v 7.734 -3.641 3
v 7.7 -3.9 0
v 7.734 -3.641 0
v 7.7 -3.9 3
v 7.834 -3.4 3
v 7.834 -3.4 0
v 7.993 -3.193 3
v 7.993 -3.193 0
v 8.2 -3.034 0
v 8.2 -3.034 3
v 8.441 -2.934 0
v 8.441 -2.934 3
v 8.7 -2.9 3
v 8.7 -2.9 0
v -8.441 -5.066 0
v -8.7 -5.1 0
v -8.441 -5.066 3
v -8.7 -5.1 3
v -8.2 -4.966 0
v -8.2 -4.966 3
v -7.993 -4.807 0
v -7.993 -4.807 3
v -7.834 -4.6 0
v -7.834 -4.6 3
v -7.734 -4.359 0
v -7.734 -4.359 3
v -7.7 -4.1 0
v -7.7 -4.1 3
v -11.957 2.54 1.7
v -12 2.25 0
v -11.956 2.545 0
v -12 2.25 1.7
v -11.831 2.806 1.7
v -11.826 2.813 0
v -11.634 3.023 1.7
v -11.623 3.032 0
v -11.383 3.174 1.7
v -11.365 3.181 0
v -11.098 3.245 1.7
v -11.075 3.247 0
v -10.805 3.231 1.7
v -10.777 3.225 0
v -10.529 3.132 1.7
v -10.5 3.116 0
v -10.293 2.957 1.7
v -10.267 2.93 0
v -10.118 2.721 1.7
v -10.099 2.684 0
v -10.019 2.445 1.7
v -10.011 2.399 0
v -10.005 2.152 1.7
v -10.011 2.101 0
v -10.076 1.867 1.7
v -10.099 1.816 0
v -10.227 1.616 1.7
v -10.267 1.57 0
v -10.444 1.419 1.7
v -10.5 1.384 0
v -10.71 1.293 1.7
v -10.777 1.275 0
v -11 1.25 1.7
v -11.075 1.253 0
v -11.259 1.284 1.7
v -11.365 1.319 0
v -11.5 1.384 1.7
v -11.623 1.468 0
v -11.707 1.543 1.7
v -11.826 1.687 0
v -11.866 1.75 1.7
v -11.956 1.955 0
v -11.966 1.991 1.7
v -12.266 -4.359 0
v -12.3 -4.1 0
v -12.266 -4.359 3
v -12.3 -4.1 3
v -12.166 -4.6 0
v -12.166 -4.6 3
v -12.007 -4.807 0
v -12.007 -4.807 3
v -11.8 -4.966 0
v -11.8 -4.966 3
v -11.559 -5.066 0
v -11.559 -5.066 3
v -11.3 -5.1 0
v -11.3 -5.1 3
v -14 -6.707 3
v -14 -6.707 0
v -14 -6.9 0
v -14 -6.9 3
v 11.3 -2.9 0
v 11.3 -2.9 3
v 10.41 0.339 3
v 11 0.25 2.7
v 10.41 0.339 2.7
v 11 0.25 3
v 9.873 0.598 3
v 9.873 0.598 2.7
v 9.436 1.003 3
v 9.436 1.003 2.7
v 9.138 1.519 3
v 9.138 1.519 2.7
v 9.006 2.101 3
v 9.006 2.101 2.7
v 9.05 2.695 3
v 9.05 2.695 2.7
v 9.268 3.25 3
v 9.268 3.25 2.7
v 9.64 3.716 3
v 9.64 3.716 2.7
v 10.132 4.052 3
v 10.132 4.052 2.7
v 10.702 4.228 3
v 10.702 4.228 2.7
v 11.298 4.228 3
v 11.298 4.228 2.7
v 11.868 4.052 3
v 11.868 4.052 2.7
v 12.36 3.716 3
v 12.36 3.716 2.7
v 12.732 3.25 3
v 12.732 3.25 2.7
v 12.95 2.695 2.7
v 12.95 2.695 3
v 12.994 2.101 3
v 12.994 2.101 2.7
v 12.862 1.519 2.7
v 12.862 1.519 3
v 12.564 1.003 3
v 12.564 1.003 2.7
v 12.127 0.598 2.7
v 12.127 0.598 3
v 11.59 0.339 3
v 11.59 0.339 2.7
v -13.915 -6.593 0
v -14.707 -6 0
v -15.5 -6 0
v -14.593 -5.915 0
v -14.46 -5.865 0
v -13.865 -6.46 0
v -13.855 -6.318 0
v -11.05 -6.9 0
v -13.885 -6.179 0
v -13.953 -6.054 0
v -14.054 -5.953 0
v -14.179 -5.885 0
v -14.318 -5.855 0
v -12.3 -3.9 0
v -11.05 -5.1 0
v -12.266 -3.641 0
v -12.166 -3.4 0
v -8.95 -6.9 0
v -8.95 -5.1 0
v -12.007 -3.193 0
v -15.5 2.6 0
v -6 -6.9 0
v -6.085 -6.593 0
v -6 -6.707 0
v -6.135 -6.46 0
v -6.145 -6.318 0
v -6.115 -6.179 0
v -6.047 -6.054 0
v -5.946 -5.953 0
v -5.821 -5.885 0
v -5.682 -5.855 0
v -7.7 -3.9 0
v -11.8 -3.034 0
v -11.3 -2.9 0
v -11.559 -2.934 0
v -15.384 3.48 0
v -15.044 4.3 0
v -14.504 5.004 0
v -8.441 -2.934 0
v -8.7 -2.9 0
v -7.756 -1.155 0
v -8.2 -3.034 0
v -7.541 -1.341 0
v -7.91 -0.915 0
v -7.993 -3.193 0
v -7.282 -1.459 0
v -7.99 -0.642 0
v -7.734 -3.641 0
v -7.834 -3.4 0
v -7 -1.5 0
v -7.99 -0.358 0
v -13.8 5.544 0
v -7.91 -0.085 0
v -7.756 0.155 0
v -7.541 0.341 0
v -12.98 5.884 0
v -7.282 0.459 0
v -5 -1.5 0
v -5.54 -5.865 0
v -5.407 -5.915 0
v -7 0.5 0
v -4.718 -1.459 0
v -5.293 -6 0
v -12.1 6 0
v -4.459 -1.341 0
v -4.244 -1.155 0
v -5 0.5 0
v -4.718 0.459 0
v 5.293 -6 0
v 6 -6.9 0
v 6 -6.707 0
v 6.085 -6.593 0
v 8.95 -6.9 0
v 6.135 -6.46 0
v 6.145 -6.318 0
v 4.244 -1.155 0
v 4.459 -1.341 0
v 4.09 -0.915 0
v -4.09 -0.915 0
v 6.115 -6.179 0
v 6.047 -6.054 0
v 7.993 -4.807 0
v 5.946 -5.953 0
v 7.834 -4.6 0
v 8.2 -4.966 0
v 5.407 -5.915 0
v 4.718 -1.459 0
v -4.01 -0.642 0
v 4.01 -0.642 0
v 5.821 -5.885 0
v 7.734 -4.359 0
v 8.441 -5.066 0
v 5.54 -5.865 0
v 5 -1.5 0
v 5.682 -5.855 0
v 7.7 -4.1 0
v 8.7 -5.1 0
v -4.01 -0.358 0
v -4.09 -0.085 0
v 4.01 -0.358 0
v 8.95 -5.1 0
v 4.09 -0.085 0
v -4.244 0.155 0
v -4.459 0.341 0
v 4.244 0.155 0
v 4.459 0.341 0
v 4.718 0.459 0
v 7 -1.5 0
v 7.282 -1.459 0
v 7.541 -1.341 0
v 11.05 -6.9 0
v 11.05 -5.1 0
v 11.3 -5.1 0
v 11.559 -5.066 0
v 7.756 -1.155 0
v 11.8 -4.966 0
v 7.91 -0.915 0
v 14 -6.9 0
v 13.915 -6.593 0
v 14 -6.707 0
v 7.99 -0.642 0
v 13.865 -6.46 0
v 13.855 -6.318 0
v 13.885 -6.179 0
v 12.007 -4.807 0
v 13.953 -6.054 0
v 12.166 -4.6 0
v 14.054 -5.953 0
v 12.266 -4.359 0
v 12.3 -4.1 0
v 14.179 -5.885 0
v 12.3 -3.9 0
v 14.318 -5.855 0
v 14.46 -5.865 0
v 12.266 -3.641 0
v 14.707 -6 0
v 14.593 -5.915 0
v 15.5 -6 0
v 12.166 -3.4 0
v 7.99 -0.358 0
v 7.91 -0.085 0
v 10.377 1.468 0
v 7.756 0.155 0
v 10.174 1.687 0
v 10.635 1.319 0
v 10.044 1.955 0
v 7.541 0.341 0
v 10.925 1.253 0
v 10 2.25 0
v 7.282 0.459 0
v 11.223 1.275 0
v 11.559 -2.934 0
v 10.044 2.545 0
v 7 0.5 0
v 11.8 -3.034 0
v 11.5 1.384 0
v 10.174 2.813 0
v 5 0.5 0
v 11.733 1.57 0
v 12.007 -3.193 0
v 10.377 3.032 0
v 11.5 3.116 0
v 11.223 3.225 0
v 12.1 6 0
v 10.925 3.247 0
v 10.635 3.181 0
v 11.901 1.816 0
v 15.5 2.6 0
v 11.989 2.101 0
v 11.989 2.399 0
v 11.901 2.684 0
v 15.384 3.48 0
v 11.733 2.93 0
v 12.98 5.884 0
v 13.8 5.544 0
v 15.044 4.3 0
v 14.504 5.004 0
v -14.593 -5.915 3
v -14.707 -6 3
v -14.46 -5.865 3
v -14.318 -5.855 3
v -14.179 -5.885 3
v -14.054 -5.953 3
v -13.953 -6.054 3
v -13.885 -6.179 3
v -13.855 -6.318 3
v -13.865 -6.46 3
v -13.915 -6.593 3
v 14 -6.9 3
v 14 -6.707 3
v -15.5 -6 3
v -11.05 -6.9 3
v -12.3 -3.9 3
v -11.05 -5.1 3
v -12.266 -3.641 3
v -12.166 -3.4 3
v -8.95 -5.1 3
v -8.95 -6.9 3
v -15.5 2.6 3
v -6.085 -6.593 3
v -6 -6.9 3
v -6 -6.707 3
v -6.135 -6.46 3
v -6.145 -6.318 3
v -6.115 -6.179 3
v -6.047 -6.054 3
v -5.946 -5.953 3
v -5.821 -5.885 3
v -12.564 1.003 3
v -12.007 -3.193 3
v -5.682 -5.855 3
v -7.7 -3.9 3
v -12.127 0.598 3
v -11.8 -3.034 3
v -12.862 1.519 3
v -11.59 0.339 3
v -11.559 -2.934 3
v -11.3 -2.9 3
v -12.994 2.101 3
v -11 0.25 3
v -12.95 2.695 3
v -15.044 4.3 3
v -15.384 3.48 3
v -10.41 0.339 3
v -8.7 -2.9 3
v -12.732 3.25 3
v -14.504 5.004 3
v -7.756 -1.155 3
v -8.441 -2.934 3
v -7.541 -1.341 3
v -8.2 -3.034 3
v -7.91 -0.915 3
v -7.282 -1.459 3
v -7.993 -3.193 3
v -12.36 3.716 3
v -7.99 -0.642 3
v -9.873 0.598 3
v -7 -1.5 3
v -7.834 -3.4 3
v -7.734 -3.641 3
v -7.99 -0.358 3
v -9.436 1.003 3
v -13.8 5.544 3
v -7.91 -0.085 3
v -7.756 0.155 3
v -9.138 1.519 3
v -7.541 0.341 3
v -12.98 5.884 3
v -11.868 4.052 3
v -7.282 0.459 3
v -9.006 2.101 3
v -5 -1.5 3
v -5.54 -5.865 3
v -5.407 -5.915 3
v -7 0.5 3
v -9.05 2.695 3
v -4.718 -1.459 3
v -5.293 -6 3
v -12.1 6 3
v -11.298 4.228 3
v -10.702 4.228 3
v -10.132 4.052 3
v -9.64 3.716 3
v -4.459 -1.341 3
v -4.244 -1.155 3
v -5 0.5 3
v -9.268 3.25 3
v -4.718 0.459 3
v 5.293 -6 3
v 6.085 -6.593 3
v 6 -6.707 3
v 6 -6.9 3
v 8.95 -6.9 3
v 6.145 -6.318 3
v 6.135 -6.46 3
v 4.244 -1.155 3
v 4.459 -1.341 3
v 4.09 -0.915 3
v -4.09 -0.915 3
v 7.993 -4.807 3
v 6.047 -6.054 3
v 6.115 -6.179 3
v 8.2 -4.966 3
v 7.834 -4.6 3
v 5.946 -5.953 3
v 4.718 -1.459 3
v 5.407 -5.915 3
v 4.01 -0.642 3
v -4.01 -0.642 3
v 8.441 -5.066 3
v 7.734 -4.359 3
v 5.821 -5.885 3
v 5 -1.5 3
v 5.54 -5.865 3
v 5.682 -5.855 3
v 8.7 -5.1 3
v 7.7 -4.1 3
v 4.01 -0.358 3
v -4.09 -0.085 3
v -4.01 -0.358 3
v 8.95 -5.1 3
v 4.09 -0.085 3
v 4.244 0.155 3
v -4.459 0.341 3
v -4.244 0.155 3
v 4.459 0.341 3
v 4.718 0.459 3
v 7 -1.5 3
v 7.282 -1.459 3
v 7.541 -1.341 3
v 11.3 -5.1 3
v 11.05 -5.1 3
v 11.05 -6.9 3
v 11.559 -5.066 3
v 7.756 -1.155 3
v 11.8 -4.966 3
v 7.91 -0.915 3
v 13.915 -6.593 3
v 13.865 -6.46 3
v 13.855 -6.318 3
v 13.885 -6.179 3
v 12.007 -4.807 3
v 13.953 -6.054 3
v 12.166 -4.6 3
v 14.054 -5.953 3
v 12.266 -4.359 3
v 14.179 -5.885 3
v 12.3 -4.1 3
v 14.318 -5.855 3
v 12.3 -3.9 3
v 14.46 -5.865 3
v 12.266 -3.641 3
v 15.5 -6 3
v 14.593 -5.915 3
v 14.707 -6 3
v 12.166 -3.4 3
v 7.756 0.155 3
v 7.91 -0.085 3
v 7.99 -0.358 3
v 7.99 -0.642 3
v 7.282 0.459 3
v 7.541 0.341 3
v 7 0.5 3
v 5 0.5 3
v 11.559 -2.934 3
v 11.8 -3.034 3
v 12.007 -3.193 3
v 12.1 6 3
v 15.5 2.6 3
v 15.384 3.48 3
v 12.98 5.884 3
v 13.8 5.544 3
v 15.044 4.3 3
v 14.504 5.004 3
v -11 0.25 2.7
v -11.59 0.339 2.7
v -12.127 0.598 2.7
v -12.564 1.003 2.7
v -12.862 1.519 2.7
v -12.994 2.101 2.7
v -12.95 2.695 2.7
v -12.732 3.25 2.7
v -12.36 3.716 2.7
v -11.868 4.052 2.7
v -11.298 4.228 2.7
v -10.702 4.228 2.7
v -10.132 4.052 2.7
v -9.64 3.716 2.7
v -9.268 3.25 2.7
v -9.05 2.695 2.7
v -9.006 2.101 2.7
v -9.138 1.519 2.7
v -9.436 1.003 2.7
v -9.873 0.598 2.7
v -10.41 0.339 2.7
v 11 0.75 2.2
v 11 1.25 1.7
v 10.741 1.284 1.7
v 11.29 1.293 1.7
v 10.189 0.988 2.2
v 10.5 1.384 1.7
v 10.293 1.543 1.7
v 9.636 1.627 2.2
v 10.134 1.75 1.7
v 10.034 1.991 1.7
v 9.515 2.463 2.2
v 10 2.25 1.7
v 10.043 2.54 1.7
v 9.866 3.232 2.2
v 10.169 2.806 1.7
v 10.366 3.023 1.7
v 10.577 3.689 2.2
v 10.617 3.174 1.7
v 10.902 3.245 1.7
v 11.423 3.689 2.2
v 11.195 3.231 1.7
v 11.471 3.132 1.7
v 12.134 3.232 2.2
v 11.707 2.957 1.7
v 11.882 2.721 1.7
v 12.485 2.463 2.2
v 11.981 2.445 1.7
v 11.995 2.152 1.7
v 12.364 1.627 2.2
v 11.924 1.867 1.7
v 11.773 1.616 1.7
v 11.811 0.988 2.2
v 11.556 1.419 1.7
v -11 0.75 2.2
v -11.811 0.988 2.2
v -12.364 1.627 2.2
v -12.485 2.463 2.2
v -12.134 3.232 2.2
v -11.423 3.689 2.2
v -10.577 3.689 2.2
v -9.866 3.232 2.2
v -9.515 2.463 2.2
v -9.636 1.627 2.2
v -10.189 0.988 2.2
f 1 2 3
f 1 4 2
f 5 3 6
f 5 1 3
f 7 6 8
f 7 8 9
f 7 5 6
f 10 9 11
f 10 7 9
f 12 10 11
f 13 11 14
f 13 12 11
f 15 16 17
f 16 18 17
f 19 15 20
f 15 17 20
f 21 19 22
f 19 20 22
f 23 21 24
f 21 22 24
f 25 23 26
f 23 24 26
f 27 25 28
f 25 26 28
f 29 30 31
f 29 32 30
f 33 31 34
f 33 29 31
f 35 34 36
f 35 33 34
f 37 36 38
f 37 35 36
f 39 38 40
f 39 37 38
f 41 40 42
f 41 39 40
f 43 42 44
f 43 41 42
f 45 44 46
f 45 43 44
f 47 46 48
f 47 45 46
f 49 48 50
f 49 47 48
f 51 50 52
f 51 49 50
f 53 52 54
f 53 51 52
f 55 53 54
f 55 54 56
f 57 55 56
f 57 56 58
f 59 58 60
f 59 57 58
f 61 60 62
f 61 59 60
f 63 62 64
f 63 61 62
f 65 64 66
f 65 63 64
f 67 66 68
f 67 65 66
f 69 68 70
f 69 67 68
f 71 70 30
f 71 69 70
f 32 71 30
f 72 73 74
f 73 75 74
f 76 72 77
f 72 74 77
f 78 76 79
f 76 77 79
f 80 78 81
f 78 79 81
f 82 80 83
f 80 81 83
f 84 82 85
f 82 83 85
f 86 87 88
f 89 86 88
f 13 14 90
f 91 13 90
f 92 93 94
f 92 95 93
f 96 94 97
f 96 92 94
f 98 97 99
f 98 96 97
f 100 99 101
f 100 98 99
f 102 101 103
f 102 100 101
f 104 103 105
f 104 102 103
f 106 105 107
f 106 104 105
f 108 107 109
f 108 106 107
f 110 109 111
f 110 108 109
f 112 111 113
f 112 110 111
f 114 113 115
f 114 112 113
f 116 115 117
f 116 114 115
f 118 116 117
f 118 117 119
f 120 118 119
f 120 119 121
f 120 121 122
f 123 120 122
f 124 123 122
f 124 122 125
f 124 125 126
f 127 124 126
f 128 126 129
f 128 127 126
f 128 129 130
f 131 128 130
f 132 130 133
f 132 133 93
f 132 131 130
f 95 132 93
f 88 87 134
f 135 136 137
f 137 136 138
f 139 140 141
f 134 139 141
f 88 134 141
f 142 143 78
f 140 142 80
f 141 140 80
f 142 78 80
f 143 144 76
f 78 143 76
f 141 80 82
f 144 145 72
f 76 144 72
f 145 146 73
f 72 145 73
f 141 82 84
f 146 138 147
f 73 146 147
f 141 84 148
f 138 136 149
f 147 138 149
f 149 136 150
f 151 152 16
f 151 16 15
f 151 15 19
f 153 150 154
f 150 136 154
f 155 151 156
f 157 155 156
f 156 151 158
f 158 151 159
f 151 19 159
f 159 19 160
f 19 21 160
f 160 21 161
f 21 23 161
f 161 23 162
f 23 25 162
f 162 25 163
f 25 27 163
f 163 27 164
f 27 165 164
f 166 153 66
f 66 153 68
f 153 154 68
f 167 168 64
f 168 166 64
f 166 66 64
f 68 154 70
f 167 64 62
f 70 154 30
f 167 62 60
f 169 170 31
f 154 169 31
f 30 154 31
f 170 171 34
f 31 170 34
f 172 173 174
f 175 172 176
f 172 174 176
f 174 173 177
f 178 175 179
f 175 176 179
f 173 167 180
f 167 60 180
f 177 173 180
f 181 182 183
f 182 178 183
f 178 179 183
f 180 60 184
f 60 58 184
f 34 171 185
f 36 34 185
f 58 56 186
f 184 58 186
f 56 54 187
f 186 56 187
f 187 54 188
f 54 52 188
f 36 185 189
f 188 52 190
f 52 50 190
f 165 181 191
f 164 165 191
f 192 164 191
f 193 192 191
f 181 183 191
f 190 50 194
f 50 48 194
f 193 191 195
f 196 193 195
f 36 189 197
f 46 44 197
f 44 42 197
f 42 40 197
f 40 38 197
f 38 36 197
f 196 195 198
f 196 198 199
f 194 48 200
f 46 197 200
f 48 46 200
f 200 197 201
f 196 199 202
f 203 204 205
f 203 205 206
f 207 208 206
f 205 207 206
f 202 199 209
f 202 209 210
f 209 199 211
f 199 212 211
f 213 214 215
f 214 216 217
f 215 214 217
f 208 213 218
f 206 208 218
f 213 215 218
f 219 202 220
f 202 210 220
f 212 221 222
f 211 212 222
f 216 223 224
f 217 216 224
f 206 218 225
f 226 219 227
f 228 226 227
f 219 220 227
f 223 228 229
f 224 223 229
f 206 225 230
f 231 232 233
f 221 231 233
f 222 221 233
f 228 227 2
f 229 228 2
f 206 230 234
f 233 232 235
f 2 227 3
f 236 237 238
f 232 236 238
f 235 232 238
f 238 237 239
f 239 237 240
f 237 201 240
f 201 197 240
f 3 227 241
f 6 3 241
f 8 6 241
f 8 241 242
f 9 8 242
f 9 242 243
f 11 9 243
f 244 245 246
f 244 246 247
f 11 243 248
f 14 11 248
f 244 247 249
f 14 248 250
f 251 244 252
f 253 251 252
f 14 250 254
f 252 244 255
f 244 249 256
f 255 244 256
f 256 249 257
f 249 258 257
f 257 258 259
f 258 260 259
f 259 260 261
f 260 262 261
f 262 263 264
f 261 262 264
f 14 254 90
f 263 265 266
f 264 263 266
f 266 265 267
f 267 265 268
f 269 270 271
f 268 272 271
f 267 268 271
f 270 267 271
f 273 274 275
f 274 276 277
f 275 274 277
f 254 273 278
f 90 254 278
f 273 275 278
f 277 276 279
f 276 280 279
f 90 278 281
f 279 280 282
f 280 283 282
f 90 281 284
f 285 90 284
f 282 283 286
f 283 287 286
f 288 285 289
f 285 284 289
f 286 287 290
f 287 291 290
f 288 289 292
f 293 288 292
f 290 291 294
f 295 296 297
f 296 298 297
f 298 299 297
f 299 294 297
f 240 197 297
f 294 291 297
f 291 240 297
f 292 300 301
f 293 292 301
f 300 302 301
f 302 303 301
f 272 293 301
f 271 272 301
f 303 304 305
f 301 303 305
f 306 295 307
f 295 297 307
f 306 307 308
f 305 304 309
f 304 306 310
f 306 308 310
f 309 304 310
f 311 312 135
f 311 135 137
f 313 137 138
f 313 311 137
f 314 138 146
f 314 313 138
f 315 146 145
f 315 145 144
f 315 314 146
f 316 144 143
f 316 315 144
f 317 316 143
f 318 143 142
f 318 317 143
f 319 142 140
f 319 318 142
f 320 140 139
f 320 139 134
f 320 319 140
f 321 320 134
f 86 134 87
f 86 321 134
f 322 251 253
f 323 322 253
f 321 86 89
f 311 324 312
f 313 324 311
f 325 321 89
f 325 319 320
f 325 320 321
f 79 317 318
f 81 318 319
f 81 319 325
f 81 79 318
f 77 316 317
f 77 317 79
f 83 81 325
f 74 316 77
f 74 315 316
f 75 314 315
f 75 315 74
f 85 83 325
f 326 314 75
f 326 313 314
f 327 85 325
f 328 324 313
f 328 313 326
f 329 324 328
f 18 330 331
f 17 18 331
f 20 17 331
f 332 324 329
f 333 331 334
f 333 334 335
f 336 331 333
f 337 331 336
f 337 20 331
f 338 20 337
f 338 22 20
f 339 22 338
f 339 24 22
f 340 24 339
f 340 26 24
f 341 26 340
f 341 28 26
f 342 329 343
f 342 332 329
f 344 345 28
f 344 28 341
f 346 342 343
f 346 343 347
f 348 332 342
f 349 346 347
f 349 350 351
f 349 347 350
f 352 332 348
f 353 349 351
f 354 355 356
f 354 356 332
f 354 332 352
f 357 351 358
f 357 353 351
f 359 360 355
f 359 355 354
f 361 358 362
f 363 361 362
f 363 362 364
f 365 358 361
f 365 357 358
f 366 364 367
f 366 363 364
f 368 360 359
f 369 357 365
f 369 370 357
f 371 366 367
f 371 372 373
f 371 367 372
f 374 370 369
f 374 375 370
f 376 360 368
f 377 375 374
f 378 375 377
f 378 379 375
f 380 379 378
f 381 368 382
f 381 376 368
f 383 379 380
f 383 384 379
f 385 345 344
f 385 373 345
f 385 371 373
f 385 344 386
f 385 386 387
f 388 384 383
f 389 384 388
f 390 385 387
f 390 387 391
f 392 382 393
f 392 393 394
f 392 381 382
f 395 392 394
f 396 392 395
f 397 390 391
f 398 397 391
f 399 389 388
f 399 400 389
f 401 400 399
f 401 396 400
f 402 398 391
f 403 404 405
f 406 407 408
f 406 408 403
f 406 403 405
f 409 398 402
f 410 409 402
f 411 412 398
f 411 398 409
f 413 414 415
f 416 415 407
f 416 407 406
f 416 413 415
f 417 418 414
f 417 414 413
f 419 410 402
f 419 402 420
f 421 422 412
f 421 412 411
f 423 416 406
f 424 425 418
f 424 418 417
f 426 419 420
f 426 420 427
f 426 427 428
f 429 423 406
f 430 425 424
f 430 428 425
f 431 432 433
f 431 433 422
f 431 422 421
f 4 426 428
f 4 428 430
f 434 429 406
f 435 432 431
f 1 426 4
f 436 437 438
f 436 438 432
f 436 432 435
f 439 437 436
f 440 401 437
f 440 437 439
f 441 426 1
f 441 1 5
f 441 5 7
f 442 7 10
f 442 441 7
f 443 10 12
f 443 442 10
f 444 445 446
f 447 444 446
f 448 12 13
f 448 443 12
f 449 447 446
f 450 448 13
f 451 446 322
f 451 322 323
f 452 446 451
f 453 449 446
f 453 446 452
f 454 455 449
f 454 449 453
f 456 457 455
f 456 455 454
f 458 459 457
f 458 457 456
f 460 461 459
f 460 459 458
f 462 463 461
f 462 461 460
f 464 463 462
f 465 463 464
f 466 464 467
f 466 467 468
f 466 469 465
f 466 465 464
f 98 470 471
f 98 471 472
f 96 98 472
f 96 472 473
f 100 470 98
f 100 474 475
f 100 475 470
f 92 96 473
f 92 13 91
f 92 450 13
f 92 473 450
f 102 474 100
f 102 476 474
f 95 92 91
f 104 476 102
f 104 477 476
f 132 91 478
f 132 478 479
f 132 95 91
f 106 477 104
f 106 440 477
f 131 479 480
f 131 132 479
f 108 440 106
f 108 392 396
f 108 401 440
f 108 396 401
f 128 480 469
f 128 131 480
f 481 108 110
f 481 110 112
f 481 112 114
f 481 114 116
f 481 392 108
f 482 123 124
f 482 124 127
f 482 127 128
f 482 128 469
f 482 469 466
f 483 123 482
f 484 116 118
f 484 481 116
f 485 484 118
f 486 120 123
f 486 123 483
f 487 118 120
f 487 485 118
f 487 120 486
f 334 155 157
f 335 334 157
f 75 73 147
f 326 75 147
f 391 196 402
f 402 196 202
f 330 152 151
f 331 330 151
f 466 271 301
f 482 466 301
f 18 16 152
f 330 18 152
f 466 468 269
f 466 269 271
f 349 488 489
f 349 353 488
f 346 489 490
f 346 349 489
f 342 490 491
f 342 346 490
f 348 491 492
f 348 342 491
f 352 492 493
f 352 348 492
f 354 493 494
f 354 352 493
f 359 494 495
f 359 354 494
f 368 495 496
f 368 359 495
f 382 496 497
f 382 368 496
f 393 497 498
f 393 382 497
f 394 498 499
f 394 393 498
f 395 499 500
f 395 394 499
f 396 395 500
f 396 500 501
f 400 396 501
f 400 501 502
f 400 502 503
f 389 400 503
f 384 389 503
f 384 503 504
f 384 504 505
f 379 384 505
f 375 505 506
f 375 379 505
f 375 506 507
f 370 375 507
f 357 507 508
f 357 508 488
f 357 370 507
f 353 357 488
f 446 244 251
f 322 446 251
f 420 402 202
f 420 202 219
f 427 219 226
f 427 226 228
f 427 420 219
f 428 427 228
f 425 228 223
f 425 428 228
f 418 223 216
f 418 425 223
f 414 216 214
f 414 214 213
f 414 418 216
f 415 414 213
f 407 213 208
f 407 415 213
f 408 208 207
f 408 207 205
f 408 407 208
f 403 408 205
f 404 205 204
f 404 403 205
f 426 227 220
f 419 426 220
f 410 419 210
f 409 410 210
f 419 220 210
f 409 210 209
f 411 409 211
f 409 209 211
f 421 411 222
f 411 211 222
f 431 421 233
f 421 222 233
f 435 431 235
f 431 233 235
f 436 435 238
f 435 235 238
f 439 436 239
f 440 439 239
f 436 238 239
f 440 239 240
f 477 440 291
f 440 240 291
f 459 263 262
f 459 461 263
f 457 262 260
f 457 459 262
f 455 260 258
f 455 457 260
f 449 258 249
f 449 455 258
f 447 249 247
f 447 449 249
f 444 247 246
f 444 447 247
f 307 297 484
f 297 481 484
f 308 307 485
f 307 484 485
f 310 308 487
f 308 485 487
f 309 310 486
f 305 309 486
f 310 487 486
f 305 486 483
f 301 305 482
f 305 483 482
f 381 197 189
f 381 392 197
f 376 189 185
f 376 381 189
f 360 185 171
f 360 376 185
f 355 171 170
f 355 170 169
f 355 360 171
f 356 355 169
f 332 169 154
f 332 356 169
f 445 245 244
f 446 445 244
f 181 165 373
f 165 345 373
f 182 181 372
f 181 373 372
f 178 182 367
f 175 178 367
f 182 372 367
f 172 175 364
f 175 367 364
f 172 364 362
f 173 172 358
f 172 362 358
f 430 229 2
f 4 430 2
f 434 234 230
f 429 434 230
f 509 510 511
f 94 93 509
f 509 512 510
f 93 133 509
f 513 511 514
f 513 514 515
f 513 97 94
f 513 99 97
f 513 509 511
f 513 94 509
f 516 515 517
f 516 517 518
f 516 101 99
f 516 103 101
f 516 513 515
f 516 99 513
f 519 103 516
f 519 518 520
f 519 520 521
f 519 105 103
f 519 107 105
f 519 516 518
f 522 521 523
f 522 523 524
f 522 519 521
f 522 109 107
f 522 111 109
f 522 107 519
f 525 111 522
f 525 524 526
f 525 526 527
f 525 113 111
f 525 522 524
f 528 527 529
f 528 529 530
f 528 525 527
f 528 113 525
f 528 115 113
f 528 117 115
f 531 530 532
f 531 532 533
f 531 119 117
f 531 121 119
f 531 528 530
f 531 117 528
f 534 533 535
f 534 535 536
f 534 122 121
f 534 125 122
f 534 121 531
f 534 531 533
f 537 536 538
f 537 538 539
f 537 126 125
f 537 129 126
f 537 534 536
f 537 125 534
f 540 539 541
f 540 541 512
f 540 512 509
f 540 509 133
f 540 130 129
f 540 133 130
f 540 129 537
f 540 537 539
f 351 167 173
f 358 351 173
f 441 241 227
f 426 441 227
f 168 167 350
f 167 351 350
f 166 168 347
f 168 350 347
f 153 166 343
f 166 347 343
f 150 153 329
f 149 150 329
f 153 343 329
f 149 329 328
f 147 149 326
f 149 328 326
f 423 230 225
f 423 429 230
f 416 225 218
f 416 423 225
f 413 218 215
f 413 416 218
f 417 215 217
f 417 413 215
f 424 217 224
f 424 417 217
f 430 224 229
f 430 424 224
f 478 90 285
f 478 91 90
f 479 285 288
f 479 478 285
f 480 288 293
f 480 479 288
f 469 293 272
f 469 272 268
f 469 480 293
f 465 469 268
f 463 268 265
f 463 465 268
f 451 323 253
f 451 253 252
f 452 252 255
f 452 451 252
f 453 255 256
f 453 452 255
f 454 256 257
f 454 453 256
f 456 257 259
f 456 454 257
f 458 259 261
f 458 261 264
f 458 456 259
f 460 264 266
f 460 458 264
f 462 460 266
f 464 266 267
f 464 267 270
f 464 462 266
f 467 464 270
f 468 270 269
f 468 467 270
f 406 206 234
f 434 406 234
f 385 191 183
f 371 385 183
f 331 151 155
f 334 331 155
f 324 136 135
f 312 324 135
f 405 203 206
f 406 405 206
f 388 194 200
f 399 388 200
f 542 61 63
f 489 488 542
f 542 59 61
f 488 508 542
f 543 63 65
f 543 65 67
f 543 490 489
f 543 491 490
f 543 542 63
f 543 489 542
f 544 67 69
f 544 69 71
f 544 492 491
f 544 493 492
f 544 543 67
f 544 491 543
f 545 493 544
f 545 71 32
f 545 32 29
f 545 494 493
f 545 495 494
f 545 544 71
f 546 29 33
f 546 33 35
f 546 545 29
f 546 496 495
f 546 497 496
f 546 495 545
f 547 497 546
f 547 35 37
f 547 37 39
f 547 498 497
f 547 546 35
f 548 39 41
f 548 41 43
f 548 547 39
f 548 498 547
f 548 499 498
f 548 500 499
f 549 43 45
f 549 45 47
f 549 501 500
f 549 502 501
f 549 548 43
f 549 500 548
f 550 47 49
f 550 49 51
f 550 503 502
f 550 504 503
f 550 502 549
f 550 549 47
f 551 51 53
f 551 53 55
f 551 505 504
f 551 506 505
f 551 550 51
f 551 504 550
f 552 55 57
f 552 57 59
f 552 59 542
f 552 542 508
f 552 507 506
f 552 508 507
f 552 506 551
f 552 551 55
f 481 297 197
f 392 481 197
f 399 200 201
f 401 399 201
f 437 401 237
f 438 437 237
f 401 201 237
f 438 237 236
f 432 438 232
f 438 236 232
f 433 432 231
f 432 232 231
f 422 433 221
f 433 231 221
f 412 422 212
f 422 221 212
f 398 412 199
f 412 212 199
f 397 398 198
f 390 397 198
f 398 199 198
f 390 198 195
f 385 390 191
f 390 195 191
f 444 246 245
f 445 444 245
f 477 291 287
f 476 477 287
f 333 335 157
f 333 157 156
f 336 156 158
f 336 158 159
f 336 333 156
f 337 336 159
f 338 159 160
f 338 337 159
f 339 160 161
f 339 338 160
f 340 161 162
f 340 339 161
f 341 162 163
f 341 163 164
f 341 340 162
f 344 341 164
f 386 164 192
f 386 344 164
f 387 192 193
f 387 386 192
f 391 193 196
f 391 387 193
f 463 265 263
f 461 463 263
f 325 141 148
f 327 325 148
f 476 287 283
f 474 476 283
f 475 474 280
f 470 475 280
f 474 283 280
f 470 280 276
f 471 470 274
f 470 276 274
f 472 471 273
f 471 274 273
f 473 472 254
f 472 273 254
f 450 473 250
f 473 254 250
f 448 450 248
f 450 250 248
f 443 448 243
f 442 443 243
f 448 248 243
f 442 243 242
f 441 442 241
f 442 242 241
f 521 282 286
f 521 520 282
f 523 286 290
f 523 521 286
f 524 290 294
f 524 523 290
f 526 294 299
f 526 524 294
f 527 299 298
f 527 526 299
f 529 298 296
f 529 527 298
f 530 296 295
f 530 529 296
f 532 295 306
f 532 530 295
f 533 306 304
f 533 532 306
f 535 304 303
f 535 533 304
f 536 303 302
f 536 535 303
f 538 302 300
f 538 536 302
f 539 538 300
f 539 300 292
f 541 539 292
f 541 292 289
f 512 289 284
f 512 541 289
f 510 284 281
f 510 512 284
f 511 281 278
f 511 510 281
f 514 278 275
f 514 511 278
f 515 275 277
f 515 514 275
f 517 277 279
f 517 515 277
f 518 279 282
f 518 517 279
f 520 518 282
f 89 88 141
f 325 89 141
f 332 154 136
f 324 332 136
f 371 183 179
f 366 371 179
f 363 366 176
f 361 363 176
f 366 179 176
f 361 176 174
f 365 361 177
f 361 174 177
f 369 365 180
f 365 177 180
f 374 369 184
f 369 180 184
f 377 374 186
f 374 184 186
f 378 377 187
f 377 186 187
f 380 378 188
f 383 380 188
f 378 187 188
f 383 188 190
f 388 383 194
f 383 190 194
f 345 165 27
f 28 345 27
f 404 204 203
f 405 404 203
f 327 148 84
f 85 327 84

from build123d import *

# Parameters (mm, degrees)
BASE_SHAPE_DEPTH                               = 3
EDGE_RADIUSES_R                                = 3.4
CAMERA_MOUNT_HOLES_REACH                       = 5
SKETCH3_R                                      = 1
CSK_FOR_M2_FLAT_HEAD_MACHINE_SCREW1_AT_2_COUNT = 2
CSK_FOR_M2_FLAT_HEAD_MACHINE_SCREW1_AT_2_PITCH = 22
MILLING_RADIUSES_R                             = 1
SKETCH8_R                                      = 0.5
MILLING_CUTS_1MM_DEPTH                         = 3


with BuildPart() as part:
    # Sketch1 → Base shape (new body)
    with BuildSketch(Plane.XY):
        Polygon((15.5, 6), (-15.5, 6), (-15.5, -6), (-14, -6), (-14, -6.9), (-11.05, -6.9), (-11.05, -5.1), (-12.3, -5.1), (-12.3, -2.9), (-7.7, -2.9), (-7.7, -5.1), (-8.95, -5.1), (-8.95, -6.9), (-6, -6.9), (-6, -6), (6, -6), (6, -6.9), (8.95, -6.9), (8.95, -5.1), (7.7, -5.1), (7.7, -2.9), (12.3, -2.9), (12.3, -5.1), (11.05, -5.1), (11.05, -6.9), (14, -6.9), (14, -6), (15.5, -6), align=None)
        with BuildLine():
            Line((-5, -1.5), (-7, -1.5))
            ThreePointArc((-7, -1.5), (-8, -0.5), (-7, 0.5))
            Line((-7, 0.5), (-5, 0.5))
            ThreePointArc((-5, 0.5), (-4, -0.5), (-5, -1.5))
        make_face(mode=Mode.SUBTRACT)
        with BuildLine():
            ThreePointArc((7, 0.5), (8, -0.5), (7, -1.5))
            Line((7, -1.5), (5, -1.5))
            ThreePointArc((5, -1.5), (4, -0.5), (5, 0.5))
            Line((5, 0.5), (7, 0.5))
        make_face(mode=Mode.SUBTRACT)
    extrude(amount=BASE_SHAPE_DEPTH)

    # Edge radiuses
    edge_radiuses_edges = [part.edges().sort_by_distance(p)[0] for p in [
        (-15.5, 6, 1.5),
        (15.5, 6, 1.5),
    ]]
    fillet(edge_radiuses_edges, radius=EDGE_RADIUSES_R)

    # Sketch3 → Camera mount holes (cut, up to next)
    with BuildSketch(Plane(origin=(0, 0, 3), x_dir=(-1, 0, 0), z_dir=(0, 0, -1)), mode=Mode.PRIVATE) as camera_mount_holes_sk1:
        with Locations((-11, 2.25)):
            Circle(SKETCH3_R)
    camera_mount_holes_tool1 = extrude(camera_mount_holes_sk1.sketch, amount=CAMERA_MOUNT_HOLES_REACH, mode=Mode.PRIVATE) & part.part
    add(camera_mount_holes_tool1.solids().sort_by_distance((11, 2.25, 3))[0], mode=Mode.SUBTRACT)
    # Sketch3 → Camera mount holes (cut, up to next)
    with BuildSketch(Plane(origin=(0, 0, 3), x_dir=(-1, 0, 0), z_dir=(0, 0, -1)), mode=Mode.PRIVATE) as camera_mount_holes_sk2:
        with Locations((11, 2.25)):
            Circle(SKETCH3_R)
    camera_mount_holes_tool2 = extrude(camera_mount_holes_sk2.sketch, amount=CAMERA_MOUNT_HOLES_REACH, mode=Mode.PRIVATE) & part.part
    add(camera_mount_holes_tool2.solids().sort_by_distance((-11, 2.25, 3))[0], mode=Mode.SUBTRACT)

    # Sketch5 → CSK for M2 Flat Head Machine Screw1 (revolve, cut)
    with BuildSketch(Plane(origin=(-11, 2.25, 3), x_dir=(0, -1, 0), z_dir=(1, 0, 0))):
        Polygon((0, 0), (0, 3), (1, 3), (1, 1.3), (2, 0.3), (2, 0), align=None)
    csk_for_m2_flat_head_machine_screw1 = revolve(axis=Axis((-11, 2.25, 9.35), (0, 0, -1)), mode=Mode.SUBTRACT)

    # CSK for M2 Flat Head Machine Screw1 at 2: CSK for M2 Flat Head Machine Screw1 ×2
    with Locations(*[(i * CSK_FOR_M2_FLAT_HEAD_MACHINE_SCREW1_AT_2_PITCH, 0, 0) for i in range(1, CSK_FOR_M2_FLAT_HEAD_MACHINE_SCREW1_AT_2_COUNT)]):
        add(csk_for_m2_flat_head_machine_screw1, mode=Mode.SUBTRACT)

    # Milling radiuses
    milling_radiuses_edges = [part.edges().sort_by_distance(p)[0] for p in [
        (-7.7, -5.1, 1.5),
        (-7.7, -2.9, 1.5),
        (-12.3, -2.9, 1.5),
        (-12.3, -5.1, 1.5),
        (12.3, -5.1, 1.5),
        (12.3, -2.9, 1.5),
        (7.7, -2.9, 1.5),
        (7.7, -5.1, 1.5),
    ]]
    fillet(milling_radiuses_edges, radius=MILLING_RADIUSES_R)

    # Sketch8 → Milling cuts 1mm (cut)
    with BuildSketch(Plane(origin=(0, 0, 3), x_dir=(-1, 0, 0), z_dir=(0, 0, -1))):
        with Locations((-14.353553391, -6.353553391)):
            Circle(SKETCH8_R)
        with Locations((14.353553391, -6.353553391)):
            Circle(SKETCH8_R)
        with Locations((-5.646446609, -6.353553391)):
            Circle(SKETCH8_R)
        with Locations((5.646446609, -6.353553391)):
            Circle(SKETCH8_R)
    extrude(amount=MILLING_CUTS_1MM_DEPTH, mode=Mode.SUBTRACT)


solid = part.part
